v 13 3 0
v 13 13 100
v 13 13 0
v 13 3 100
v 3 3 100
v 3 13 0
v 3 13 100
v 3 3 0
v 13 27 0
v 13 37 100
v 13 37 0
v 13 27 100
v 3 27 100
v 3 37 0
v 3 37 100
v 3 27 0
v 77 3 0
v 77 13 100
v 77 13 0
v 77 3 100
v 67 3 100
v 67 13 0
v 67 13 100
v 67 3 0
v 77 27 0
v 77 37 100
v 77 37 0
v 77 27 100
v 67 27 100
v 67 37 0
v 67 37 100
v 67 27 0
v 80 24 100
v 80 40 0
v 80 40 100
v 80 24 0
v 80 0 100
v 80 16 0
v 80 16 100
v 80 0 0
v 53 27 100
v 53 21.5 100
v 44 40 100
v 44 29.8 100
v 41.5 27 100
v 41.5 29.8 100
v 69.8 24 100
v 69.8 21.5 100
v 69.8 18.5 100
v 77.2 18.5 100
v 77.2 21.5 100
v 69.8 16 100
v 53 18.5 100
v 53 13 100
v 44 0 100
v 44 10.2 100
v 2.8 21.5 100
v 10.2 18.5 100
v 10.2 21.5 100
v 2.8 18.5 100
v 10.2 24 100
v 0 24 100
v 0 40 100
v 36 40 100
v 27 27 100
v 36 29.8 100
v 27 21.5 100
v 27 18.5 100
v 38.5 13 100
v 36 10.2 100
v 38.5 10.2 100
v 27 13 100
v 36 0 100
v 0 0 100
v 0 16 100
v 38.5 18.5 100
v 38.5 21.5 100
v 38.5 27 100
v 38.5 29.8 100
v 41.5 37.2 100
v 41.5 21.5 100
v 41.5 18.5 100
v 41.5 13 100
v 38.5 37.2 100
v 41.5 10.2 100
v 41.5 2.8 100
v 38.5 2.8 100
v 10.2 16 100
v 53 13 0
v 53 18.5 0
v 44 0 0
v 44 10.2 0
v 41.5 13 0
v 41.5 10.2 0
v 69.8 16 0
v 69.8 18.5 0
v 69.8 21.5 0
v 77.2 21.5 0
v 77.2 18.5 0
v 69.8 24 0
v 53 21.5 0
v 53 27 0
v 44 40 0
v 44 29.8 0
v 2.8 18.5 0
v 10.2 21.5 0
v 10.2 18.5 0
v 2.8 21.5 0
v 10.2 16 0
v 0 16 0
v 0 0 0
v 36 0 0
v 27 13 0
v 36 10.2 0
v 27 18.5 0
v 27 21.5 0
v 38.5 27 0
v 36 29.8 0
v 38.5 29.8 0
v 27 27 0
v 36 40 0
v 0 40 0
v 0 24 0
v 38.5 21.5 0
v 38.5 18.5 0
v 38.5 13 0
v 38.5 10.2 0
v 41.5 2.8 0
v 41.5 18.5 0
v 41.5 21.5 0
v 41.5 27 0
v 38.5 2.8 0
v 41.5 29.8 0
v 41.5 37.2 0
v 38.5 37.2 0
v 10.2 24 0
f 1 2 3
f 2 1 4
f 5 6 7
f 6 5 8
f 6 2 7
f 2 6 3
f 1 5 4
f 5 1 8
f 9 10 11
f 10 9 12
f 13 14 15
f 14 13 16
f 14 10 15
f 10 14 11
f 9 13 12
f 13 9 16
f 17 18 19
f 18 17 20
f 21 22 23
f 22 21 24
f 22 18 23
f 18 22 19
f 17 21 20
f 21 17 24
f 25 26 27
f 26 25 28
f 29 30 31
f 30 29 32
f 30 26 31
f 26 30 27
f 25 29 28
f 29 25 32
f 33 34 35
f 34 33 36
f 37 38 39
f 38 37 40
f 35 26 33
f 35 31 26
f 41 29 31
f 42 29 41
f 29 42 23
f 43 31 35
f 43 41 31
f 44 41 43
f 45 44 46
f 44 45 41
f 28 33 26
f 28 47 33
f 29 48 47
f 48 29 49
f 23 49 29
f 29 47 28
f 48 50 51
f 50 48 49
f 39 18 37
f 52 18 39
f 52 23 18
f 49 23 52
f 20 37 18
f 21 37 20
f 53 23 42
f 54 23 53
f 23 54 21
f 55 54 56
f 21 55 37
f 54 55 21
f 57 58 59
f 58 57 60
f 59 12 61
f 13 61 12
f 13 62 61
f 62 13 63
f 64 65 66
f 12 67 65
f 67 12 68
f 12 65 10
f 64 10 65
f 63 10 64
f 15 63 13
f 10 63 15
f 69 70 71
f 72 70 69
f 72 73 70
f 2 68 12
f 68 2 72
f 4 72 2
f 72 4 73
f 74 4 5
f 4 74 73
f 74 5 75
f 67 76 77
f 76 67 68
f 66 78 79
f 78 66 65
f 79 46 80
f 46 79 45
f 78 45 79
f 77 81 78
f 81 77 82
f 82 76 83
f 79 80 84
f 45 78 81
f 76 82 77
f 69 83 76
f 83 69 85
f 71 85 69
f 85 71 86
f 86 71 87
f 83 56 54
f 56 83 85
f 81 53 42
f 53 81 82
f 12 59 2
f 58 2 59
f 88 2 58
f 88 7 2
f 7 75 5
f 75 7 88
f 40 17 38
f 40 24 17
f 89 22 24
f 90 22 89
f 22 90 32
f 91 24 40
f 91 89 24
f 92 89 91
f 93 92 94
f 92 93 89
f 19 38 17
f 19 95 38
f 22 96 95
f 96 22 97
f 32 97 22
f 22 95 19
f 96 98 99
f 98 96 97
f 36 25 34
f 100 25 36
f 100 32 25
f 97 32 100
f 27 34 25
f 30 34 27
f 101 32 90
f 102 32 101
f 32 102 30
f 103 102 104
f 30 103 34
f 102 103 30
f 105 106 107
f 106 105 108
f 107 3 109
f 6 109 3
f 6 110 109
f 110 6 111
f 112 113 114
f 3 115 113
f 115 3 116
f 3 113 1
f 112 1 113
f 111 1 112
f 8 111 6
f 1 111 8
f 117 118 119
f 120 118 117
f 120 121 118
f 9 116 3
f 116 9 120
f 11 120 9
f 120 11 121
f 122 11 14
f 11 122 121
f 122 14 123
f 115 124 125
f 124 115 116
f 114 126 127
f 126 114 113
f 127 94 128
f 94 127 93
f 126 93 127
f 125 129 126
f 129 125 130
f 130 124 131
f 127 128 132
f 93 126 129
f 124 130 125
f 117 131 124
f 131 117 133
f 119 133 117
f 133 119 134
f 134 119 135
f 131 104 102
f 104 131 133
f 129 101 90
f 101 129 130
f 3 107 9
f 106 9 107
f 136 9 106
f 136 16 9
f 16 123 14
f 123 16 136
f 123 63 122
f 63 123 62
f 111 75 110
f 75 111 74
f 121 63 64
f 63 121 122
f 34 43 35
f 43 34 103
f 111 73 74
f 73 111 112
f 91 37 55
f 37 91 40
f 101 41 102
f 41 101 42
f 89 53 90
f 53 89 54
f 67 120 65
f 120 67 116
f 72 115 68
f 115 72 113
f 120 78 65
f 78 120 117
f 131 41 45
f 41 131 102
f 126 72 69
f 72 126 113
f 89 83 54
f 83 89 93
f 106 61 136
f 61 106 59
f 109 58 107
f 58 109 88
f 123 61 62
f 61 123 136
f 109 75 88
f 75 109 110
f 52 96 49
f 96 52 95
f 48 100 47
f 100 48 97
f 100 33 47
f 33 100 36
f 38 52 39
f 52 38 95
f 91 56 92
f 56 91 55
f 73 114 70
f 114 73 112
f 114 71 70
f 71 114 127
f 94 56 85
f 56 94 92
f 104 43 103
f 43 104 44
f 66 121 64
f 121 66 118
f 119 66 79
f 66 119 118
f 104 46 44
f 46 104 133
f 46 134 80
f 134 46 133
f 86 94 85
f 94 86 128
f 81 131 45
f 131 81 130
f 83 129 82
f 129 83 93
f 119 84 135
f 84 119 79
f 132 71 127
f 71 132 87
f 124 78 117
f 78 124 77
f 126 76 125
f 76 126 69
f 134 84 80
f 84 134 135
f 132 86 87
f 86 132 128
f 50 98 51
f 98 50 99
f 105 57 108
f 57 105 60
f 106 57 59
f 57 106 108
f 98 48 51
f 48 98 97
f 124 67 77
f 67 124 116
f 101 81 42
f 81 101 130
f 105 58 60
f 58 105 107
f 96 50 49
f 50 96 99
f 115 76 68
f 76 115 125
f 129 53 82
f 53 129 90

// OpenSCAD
$fn = 64;

// 40x80 aluminium extrusion profile, 100mm long (simplified 4080 T-slot style)
length = 100;
W = 80;   // X
H = 40;   // Y

// Profile feature parameters (mm)
wall = 3.0;          // outer wall thickness
slot_w = 8.0;        // T-slot opening width
slot_depth = 10.0;   // depth of slot cut from each face
center_void_w = 26;  // central rectangular void width (X)
center_void_h = 14;  // central rectangular void height (Y)
web = 3.0;           // internal web thickness

eps = 0.2;           // small overlap to avoid coplanar artifacts

module extrusion_4080(len=100) {

    // Build as: (outer - voids/slots/pockets) + webs, all in ONE connected solid
    union() {
        difference() {
            // Outer body
            cube([W, H, len], center=false);

            // Central void
            translate([(W - center_void_w)/2, (H - center_void_h)/2, -eps])
                cube([center_void_w, center_void_h, len + 2*eps], center=false);

            // T-slots on all four faces (rectangular simplification)
            // Left face slot
            translate([-eps, (H - slot_w)/2, -eps])
                cube([slot_depth + 2*eps, slot_w, len + 2*eps], center=false);

            // Right face slot
            translate([W - slot_depth - eps, (H - slot_w)/2, -eps])
                cube([slot_depth + 2*eps, slot_w, len + 2*eps], center=false);

            // Bottom face slot
            translate([(W - slot_w)/2, -eps, -eps])
                cube([slot_w, slot_depth + 2*eps, len + 2*eps], center=false);

            // Top face slot
            translate([(W - slot_w)/2, H - slot_depth - eps, -eps])
                cube([slot_w, slot_depth + 2*eps, len + 2*eps], center=false);

            // Corner relief pockets (kept inside the wall so the outer shell remains connected)
            pocket = 10;
            for (sx = [0, 1], sy = [0, 1]) {
                translate([
                    sx ? (W - wall - pocket) : wall,
                    sy ? (H - wall - pocket) : wall,
                    -eps
                ])
                    cube([pocket, pocket, len + 2*eps], center=false);
            }
        }

        // Internal webs (added back; overlap slightly into outer shell to guarantee connectivity)
        // Vertical web
        translate([(W - web)/2, wall - eps, 0])
            cube([web, H - 2*wall + 2*eps, len], center=false);

        // Horizontal web
        translate([wall - eps, (H - web)/2, 0])
            cube([W - 2*wall + 2*eps, web, len], center=false);
    }
}

color([0.75, 0.75, 0.78])
extrusion_4080(length);
